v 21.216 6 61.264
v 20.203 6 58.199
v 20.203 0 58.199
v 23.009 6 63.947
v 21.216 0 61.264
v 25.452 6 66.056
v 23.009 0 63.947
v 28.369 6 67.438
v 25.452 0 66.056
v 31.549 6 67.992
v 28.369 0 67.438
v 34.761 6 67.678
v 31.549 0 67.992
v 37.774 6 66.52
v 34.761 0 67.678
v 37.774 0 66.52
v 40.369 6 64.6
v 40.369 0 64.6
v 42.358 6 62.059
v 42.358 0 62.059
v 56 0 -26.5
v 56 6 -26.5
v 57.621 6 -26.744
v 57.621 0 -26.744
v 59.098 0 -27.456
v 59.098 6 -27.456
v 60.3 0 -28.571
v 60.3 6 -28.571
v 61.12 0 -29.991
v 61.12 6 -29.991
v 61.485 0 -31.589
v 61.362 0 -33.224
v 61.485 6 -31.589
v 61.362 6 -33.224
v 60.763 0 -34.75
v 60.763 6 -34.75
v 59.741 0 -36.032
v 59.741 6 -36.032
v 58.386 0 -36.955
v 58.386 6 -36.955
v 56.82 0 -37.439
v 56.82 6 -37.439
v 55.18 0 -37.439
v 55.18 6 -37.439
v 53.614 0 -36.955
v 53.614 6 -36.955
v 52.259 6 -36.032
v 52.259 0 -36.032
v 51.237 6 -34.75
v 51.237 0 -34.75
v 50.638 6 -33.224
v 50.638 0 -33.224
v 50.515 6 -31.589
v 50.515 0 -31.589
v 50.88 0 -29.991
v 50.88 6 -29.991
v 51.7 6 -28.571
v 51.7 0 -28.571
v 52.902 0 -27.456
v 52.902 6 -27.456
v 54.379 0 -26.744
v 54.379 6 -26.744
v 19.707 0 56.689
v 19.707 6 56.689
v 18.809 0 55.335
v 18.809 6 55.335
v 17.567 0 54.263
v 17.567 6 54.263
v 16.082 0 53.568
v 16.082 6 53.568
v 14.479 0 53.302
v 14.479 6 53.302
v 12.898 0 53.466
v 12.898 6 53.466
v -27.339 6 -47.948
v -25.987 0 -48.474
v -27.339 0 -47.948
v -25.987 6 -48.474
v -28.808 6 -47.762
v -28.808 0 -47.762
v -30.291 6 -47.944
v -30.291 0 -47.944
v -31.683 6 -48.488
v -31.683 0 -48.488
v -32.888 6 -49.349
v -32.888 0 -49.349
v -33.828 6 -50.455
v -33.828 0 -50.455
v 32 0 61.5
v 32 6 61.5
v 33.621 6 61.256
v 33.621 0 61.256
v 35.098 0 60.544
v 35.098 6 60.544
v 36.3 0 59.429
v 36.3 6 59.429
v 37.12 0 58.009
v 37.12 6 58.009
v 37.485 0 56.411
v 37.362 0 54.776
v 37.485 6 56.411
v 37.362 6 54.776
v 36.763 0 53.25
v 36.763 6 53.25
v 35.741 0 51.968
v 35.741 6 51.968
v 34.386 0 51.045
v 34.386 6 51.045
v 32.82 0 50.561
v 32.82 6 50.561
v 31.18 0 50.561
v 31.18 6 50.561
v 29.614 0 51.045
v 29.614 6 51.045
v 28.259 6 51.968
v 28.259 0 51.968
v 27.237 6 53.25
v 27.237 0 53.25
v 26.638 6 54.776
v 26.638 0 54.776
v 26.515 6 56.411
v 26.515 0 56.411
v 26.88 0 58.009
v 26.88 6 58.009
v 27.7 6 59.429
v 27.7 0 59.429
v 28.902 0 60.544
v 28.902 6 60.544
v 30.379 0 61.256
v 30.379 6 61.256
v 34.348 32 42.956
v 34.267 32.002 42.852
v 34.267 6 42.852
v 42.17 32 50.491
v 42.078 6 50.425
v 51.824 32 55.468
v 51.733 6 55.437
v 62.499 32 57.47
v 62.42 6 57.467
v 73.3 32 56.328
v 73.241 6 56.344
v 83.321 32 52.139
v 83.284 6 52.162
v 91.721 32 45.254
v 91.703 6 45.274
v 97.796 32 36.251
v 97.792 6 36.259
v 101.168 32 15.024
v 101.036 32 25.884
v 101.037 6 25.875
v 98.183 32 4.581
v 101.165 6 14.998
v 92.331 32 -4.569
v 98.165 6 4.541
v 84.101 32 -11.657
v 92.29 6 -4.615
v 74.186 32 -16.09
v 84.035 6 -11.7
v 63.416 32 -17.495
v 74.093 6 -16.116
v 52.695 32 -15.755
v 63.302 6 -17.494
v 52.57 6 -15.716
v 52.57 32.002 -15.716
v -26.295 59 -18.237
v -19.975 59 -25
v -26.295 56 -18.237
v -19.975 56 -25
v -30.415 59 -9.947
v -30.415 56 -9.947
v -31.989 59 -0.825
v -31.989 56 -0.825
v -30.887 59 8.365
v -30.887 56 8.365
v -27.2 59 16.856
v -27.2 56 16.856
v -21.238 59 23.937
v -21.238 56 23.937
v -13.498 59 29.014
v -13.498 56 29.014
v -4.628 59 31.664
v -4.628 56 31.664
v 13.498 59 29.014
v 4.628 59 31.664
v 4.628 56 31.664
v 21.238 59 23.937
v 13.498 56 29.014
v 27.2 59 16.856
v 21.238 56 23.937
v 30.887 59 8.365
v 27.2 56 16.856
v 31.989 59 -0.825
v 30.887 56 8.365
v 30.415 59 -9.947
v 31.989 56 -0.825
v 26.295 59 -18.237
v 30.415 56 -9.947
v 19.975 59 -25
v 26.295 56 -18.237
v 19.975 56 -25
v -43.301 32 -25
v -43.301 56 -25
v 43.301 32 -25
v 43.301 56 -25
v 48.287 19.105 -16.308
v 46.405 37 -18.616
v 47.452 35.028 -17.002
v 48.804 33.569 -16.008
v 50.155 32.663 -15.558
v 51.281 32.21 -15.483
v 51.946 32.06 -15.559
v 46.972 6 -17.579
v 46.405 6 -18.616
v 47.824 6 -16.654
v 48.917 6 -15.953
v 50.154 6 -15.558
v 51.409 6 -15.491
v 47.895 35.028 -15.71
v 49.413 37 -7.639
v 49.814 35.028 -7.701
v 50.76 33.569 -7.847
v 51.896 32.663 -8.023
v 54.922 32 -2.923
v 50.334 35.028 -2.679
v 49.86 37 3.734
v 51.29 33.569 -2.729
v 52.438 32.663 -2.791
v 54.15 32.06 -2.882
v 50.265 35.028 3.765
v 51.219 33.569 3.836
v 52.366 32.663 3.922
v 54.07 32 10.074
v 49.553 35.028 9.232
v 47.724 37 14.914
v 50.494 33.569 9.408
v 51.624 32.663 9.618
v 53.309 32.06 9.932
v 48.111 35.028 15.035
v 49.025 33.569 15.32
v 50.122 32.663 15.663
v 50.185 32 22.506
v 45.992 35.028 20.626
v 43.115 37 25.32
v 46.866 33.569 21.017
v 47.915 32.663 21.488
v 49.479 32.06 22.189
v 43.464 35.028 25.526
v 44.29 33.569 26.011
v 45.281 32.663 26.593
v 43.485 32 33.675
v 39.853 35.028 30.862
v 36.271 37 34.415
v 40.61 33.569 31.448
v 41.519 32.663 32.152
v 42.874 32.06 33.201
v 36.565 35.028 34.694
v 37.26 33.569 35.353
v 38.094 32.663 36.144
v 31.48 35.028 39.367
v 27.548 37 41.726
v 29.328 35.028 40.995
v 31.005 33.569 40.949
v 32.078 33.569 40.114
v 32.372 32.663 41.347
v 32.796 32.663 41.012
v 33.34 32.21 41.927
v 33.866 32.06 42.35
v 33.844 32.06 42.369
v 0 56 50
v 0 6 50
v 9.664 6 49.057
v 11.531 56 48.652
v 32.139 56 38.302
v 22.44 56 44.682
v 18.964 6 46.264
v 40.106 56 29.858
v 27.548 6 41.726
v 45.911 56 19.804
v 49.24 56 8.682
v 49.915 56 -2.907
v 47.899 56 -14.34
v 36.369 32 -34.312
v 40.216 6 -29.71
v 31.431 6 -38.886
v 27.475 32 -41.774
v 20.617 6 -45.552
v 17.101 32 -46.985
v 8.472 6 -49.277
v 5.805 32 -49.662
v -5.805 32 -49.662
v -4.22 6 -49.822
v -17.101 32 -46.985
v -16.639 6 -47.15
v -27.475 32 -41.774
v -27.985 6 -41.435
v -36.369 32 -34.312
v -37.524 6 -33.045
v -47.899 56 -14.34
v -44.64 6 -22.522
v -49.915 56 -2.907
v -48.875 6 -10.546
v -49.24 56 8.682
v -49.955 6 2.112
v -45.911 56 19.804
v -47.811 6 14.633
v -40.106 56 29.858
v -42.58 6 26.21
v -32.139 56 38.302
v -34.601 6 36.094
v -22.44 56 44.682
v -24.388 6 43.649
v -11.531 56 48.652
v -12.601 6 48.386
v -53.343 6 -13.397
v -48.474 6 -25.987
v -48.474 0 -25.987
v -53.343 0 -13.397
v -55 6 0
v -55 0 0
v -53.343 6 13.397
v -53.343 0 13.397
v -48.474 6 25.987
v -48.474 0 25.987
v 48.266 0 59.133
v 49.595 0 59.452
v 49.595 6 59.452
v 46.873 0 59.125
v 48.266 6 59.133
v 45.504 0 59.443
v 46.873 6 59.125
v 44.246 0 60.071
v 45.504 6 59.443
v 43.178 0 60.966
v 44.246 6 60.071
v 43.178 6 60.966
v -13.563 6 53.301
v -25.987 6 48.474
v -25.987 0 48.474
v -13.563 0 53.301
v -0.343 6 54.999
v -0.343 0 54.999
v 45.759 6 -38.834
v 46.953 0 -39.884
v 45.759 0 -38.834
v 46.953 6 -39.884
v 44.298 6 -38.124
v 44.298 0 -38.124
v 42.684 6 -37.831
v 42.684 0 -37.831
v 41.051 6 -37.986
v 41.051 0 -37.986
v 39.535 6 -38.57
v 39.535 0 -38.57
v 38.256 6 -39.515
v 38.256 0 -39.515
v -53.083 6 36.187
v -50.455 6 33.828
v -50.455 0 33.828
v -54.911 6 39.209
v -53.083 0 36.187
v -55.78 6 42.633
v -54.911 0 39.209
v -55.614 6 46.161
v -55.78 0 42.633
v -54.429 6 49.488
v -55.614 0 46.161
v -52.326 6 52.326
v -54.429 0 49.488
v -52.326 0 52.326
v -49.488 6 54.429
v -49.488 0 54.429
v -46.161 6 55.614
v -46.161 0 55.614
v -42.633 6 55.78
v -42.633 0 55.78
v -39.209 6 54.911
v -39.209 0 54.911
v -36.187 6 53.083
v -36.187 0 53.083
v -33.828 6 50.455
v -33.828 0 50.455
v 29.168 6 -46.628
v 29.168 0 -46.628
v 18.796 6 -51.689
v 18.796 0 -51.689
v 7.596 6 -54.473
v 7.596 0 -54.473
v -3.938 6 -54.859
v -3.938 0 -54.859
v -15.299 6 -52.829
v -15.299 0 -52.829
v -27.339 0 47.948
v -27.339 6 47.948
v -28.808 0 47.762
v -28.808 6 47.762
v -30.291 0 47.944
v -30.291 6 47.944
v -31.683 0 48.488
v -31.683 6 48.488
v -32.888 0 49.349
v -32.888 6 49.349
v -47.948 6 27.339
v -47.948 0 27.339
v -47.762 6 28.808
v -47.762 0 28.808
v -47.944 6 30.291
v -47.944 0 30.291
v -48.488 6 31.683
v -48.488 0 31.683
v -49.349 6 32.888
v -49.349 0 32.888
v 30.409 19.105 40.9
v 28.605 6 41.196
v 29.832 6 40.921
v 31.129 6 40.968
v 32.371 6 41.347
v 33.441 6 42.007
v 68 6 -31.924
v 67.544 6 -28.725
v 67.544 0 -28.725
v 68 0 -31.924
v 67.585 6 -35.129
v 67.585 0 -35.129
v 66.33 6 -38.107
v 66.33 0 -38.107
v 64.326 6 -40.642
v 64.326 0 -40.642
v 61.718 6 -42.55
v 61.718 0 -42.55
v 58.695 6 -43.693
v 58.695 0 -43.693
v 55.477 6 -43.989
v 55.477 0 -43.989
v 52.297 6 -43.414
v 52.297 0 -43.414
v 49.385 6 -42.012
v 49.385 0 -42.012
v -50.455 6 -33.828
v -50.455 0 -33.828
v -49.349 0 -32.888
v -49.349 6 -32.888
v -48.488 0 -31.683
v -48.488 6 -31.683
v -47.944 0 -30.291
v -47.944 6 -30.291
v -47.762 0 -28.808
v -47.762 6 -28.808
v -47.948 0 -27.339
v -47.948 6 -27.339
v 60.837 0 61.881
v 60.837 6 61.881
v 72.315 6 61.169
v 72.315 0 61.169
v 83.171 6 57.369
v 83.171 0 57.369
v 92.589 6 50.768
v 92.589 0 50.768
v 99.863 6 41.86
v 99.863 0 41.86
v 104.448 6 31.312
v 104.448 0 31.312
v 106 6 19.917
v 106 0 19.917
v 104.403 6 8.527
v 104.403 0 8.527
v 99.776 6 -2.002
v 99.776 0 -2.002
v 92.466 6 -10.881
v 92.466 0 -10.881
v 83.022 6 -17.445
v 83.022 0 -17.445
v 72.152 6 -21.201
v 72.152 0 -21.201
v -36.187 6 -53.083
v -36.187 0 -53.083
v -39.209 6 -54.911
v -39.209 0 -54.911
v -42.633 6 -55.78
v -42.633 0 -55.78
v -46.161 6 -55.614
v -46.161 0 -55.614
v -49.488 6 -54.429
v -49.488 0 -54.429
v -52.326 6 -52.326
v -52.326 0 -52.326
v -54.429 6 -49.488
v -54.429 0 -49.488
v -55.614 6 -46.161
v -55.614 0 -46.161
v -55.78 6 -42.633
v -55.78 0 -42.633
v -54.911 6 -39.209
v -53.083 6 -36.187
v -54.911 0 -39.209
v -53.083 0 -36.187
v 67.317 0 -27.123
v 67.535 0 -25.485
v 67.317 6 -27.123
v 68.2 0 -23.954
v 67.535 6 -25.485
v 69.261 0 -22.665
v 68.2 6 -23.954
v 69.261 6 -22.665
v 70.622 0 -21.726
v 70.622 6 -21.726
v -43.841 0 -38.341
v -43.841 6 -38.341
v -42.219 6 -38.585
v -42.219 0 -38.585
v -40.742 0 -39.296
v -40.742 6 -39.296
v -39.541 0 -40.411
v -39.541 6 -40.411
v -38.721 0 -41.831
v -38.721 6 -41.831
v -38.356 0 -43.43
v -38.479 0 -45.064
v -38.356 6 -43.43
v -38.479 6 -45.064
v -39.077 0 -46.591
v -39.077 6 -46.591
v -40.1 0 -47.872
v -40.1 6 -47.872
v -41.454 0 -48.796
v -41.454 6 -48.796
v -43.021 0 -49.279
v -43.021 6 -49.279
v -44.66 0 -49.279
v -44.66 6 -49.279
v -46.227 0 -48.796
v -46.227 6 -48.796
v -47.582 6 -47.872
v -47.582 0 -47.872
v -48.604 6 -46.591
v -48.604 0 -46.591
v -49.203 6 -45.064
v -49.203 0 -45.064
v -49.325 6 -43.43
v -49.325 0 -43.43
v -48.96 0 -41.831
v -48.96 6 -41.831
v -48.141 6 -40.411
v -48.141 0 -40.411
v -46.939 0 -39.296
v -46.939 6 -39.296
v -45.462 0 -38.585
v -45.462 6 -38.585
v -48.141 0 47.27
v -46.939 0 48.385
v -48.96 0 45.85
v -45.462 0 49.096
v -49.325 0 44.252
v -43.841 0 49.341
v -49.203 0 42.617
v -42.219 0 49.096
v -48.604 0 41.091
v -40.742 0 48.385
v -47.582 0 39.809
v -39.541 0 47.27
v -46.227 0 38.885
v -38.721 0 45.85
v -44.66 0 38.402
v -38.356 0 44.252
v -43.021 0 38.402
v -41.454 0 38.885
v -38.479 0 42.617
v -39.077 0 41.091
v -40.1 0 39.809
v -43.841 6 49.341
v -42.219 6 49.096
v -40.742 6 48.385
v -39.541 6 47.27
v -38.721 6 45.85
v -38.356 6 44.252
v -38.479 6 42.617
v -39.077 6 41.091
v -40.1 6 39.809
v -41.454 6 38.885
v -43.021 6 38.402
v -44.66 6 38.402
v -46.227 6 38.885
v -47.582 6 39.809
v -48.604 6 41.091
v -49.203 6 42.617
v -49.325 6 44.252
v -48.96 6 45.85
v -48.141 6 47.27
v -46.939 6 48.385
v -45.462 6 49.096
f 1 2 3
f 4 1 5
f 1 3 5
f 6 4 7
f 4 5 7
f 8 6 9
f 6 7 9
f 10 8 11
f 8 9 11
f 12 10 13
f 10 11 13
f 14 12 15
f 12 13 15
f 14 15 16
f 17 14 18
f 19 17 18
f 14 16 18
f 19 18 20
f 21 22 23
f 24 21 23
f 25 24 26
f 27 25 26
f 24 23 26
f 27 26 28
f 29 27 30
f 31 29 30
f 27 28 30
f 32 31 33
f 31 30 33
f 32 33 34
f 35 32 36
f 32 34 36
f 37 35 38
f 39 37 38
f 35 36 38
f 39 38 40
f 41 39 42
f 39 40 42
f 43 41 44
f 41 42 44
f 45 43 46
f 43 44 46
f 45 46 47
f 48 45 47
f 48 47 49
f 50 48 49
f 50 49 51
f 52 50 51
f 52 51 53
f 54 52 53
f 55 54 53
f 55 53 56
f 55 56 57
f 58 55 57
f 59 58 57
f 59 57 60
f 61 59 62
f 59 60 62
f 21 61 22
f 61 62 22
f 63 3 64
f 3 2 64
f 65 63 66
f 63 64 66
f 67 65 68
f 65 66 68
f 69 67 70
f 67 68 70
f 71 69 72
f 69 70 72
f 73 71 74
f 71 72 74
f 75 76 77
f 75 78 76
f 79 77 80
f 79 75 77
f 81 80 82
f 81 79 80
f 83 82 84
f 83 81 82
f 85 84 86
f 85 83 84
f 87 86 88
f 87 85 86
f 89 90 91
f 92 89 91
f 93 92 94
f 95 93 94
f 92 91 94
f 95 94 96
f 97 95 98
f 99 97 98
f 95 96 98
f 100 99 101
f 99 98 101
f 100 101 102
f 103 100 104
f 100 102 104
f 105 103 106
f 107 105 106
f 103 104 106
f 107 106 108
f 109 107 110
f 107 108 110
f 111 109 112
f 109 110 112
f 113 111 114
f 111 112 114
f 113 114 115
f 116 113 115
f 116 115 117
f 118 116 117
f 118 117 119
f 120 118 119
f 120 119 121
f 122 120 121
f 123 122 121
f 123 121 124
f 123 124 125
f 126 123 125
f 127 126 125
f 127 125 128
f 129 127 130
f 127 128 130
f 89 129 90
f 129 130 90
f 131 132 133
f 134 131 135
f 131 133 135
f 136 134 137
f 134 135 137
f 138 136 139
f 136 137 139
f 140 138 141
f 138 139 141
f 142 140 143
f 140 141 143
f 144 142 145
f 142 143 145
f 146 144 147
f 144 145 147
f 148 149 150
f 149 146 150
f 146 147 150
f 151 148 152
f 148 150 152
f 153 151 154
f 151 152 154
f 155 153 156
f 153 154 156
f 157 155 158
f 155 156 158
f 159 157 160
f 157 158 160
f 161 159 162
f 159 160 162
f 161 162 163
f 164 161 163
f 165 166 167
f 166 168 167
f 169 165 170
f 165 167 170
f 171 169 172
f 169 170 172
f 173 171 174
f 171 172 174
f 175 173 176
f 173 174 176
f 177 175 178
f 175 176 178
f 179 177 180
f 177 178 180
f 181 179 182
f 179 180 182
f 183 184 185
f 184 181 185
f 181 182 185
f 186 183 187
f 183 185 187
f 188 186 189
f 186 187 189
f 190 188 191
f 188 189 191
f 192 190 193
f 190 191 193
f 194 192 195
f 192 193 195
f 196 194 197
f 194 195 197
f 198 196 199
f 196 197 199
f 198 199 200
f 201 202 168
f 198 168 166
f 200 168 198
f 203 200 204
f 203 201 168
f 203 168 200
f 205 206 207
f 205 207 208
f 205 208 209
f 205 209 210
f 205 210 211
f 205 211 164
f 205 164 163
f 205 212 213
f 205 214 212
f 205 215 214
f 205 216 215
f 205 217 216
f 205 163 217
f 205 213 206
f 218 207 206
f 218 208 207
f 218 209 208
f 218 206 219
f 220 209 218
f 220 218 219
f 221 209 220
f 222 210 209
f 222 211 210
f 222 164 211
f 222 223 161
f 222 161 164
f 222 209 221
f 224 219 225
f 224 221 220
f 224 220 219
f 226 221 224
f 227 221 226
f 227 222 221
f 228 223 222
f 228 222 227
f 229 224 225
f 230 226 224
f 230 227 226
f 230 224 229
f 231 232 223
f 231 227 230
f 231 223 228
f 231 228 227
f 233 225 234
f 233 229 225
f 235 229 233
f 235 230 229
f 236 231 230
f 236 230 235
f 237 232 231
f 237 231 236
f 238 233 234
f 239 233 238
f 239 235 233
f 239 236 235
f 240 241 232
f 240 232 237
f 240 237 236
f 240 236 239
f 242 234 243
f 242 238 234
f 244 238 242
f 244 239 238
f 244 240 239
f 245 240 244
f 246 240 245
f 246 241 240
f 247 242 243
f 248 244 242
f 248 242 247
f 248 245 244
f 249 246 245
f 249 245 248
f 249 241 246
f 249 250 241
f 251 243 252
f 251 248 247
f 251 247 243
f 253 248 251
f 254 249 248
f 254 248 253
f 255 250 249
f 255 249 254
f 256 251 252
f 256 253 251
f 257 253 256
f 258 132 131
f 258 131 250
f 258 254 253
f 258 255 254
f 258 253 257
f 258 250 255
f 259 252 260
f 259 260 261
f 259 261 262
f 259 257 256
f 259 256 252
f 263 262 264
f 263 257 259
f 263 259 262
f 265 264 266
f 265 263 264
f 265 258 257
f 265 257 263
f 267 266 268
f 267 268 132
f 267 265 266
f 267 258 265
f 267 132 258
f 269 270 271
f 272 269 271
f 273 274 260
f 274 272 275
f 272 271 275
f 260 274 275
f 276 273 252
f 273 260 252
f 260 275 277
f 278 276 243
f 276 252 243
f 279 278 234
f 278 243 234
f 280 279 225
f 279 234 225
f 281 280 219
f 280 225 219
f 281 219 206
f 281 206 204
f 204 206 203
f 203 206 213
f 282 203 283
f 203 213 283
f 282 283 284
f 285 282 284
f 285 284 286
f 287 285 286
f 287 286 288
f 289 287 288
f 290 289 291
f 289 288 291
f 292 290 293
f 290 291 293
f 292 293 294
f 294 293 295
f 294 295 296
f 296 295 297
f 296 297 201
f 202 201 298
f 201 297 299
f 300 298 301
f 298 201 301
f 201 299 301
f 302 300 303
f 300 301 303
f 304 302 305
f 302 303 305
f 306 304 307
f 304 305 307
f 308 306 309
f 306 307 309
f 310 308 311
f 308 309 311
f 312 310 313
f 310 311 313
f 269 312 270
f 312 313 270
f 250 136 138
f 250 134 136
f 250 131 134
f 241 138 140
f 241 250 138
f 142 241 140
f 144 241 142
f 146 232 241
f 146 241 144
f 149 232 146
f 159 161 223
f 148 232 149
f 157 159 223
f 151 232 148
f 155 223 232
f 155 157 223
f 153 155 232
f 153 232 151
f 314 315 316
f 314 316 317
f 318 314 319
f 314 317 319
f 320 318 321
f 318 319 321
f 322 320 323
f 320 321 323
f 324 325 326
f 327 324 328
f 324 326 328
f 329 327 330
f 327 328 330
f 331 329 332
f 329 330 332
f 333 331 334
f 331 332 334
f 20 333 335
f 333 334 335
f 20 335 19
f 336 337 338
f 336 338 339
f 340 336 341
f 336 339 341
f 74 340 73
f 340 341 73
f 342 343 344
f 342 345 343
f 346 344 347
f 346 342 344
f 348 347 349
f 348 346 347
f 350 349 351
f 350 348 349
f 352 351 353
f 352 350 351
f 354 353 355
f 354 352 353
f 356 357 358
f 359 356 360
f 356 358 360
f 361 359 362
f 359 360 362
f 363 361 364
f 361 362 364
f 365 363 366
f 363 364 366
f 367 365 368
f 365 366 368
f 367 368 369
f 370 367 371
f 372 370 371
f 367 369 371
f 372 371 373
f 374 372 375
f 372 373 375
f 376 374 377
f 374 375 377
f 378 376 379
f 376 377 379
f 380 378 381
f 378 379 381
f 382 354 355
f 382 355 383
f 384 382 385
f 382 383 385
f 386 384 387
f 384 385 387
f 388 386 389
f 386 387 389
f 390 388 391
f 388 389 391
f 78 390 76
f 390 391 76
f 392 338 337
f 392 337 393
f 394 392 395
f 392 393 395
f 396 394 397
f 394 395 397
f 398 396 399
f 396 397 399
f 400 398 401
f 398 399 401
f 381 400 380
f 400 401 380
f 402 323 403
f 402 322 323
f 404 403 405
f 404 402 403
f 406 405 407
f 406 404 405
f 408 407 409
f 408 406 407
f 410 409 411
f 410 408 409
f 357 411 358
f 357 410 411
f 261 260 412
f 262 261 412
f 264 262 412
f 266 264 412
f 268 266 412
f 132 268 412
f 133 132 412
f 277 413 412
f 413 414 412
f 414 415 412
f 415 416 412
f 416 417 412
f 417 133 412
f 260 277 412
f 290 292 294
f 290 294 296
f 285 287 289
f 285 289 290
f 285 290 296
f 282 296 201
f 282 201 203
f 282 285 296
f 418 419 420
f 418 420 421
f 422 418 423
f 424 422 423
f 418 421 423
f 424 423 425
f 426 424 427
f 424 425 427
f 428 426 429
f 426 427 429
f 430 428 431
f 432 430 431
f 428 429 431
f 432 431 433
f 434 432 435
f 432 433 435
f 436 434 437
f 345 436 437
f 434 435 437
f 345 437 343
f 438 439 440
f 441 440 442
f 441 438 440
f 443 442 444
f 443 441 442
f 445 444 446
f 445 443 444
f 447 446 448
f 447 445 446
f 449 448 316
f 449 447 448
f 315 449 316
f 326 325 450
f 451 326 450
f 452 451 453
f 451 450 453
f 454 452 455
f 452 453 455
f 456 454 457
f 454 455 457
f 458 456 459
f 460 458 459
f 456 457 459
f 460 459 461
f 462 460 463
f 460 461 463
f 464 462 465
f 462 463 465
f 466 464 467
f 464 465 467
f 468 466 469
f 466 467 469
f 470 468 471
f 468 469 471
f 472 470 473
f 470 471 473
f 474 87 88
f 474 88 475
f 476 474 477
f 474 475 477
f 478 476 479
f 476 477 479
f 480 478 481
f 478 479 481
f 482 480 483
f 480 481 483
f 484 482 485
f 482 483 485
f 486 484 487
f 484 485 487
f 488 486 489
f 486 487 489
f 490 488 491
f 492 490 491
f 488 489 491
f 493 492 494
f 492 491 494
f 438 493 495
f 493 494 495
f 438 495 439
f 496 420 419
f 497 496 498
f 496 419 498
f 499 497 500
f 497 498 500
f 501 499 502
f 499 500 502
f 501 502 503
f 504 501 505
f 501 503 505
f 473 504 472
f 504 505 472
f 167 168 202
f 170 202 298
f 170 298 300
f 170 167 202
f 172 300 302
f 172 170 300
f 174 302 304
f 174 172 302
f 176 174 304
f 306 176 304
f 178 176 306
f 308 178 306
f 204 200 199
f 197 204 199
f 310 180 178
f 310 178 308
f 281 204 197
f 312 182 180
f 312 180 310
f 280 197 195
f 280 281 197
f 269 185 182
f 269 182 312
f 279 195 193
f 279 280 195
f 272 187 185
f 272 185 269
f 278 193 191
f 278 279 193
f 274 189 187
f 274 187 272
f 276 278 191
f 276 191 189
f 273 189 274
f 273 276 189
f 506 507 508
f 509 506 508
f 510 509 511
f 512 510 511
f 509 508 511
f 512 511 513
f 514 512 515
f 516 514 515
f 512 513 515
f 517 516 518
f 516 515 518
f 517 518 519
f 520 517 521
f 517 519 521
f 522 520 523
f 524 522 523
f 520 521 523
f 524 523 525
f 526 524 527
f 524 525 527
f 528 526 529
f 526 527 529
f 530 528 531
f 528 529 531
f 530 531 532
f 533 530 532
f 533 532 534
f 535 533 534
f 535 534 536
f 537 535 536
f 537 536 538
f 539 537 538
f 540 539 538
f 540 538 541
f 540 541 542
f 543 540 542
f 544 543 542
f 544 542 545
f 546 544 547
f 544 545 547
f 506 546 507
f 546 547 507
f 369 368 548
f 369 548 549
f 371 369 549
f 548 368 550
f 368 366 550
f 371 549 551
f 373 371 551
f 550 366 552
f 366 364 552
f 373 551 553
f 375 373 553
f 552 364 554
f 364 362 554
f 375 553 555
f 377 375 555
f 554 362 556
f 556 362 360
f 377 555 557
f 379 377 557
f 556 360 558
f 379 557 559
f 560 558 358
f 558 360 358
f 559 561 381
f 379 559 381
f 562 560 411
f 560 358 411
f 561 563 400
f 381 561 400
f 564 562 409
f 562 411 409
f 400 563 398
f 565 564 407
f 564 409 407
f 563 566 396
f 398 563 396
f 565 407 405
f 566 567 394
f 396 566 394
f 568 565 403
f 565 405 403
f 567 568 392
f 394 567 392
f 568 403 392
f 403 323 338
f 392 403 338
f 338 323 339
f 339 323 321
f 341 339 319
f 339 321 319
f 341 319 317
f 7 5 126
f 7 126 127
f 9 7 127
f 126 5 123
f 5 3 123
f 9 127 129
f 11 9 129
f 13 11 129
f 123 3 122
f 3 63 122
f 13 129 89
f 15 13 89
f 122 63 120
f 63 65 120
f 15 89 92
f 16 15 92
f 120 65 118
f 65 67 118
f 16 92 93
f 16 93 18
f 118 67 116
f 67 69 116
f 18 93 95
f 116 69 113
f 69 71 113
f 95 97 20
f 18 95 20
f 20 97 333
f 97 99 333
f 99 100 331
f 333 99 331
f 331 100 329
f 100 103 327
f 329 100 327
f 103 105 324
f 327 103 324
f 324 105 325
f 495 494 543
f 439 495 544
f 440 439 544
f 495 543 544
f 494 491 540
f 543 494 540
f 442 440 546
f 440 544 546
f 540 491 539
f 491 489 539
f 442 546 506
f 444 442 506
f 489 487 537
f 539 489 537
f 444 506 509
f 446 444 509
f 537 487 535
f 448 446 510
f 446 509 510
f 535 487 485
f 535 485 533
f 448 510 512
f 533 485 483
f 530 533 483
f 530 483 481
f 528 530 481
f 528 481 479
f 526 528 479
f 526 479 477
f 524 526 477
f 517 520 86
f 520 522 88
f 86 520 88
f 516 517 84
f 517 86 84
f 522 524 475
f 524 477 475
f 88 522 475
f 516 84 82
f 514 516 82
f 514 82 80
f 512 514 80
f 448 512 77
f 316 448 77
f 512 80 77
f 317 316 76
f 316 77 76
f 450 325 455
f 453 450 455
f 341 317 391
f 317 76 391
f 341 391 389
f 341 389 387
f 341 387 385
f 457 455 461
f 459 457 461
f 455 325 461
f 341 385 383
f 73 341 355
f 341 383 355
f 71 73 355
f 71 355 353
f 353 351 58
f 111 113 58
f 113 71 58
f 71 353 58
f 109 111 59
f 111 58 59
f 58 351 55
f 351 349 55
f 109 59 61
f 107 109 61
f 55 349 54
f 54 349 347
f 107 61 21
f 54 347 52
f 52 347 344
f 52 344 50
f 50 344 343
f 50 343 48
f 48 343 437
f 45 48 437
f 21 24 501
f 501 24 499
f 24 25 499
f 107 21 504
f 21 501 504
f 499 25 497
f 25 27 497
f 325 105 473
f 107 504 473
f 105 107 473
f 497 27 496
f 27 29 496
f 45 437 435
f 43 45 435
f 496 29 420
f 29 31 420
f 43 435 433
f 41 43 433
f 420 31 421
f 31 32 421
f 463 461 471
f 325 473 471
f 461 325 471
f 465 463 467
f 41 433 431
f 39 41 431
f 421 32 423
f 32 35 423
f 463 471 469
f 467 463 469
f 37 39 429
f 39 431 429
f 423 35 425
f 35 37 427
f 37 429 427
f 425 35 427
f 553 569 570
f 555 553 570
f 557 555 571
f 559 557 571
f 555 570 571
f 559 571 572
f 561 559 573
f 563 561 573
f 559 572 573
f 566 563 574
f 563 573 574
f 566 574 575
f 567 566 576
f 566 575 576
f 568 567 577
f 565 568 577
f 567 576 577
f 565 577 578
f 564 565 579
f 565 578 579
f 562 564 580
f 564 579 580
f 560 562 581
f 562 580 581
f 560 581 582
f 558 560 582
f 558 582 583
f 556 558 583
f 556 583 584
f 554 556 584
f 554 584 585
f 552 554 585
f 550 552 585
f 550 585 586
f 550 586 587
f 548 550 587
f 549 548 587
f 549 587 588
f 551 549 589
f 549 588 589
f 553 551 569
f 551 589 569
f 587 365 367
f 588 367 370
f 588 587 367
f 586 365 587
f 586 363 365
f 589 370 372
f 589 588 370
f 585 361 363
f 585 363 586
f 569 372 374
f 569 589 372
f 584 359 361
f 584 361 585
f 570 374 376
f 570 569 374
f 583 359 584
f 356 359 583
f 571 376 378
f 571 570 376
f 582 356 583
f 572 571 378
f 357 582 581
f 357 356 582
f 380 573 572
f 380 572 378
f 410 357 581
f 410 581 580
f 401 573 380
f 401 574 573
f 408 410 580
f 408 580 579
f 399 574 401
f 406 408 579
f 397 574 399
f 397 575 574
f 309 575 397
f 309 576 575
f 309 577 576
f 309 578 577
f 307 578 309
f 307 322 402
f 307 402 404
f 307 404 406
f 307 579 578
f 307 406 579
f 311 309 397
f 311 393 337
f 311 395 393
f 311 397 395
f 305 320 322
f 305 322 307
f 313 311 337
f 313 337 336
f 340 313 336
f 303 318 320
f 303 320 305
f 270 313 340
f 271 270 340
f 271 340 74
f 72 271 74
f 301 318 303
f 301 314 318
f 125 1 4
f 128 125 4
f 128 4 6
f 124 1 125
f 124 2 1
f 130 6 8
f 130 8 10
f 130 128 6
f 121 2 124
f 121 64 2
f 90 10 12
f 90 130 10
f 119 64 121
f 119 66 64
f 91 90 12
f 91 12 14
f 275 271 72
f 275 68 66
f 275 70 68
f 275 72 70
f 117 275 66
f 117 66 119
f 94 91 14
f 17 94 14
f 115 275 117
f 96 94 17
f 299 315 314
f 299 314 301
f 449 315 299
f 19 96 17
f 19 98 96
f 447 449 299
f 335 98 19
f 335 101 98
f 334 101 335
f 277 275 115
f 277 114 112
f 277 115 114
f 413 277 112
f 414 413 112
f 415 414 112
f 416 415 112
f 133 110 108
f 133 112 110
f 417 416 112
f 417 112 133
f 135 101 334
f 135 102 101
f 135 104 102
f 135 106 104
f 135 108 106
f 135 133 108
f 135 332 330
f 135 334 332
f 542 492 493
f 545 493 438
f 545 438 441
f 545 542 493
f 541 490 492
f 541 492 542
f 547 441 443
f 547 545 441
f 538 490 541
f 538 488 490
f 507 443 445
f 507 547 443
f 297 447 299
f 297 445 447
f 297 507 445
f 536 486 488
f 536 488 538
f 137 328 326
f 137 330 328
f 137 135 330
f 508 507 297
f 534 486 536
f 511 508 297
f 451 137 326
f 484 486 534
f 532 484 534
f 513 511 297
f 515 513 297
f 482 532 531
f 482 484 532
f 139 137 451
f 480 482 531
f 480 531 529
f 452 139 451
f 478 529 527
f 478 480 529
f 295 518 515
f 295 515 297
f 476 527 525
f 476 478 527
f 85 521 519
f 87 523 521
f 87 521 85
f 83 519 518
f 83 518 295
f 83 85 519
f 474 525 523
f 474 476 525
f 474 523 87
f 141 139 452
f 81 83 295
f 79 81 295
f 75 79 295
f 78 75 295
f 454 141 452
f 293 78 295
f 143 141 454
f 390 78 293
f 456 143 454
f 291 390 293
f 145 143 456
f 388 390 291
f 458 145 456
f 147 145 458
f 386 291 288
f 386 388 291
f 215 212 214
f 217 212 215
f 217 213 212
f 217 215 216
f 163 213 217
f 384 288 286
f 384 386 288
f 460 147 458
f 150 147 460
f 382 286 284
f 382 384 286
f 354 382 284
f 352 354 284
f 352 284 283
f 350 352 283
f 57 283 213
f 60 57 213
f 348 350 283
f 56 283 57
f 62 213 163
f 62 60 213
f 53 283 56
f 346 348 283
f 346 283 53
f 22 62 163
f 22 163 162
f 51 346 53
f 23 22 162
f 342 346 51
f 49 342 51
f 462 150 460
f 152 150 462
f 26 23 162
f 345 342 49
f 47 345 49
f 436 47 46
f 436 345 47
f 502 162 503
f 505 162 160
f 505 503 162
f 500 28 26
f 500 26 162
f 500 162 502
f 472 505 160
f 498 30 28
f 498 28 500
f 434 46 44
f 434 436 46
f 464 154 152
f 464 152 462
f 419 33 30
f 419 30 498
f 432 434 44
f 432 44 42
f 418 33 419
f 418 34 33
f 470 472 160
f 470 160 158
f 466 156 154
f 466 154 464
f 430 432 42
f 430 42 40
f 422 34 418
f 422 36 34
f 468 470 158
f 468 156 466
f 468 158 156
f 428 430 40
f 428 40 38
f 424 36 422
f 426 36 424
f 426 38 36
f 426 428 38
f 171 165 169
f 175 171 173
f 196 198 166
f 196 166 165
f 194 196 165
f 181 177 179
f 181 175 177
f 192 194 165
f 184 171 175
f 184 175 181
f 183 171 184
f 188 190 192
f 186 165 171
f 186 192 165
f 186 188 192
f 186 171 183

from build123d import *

# Parameters (mm, degrees)
BOSS_EXTRUDE1_DEPTH = 6
SKETCH2_R           = 5.5
CUT_EXTRUDE1_DEPTH  = 6
SKETCH3_R           = 50
BOSS_EXTRUDE2_DEPTH = 50
SKETCH4_R           = 37.5
BOSS_EXTRUDE3_DEPTH = 26
SKETCH5_R           = 32
BOSS_EXTRUDE4_DEPTH = 3
FILLET2_R           = 6
FILLET3_R           = 6
FILLET4_R           = 5
CUT_EXTRUDE2_START  = -27
CUT_EXTRUDE2_DEPTH  = 27


with BuildPart() as part:
    # Sketch1 → Boss-Extrude1 (new body)
    with BuildSketch(Plane(origin=(0, 0, 0), x_dir=(1, 0, 0), z_dir=(0, 1, 0))):
        with BuildLine():
            ThreePointArc((21.211789327, -50.745048956), (28.860136885, -67.581936782), (43.965179902, -56.913493246))
            ThreePointArc((43.965179902, -56.913493246), (104.875389558, -29.654145663), (62.597817721, 21.976587342))
            ThreePointArc((62.597817721, 21.976587342), (62.107138398, 42.329707672), (44.037643352, 32.949749135))
            ThreePointArc((44.037643352, 32.949749135), (8.49481412, 54.340023308), (-31.880473469, 44.817802394))
            ThreePointArc((-31.880473469, 44.817802394), (-52.325901808, 52.325901808), (-44.817802394, 31.880473469))
            ThreePointArc((-44.817802394, 31.880473469), (-55, 0), (-44.817802394, -31.880473469))
            ThreePointArc((-44.817802394, -31.880473469), (-52.325901808, -52.325901808), (-31.880473469, -44.817802394))
            ThreePointArc((-31.880473469, -44.817802394), (-6.102316632, -54.660421986), (21.211789327, -50.745048956))
        make_face()
    extrude(amount=BOSS_EXTRUDE1_DEPTH)

    # Sketch2 → Cut-Extrude1 (cut)
    with BuildSketch(Plane(origin=(0, 6, 0), x_dir=(1, 0, 0), z_dir=(0, 1, 0))):
        with Locations(Location((56, 32, 0), (0, 0, 270))):
            Circle(SKETCH2_R)
        with Locations(Location((-43.840620434, 43.840620434, 0), (0, 0, 270))):
            Circle(SKETCH2_R)
        with Locations(Location((-43.840620434, -43.840620434, 0), (0, 0, 270))):
            Circle(SKETCH2_R)
        with Locations(Location((32, -56, 0), (0, 0, 270))):
            Circle(SKETCH2_R)
    extrude(amount=-CUT_EXTRUDE1_DEPTH, mode=Mode.SUBTRACT)

    # Sketch3 → Boss-Extrude2 (add)
    with BuildSketch(Plane(origin=(0, 6, 0), x_dir=(1, 0, 0), z_dir=(0, 1, 0))):
        with Locations(Location((0, 0, 0), (0, 0, 270))):
            Circle(SKETCH3_R)
    extrude(amount=BOSS_EXTRUDE2_DEPTH)

    # Sketch4 → Boss-Extrude3 (add)
    with BuildSketch(Plane(origin=(0, 6, 0), x_dir=(1, 0, 0), z_dir=(0, 1, 0))):
        with Locations((64, -20)):
            Circle(SKETCH4_R)
    extrude(amount=BOSS_EXTRUDE3_DEPTH)

    # Sketch5 → Boss-Extrude4 (add)
    with BuildSketch(Plane(origin=(0, 56, 0), x_dir=(1, 0, 0), z_dir=(0, 1, 0))):
        with Locations(Location((0, 0, 0), (0, 0, 270))):
            Circle(SKETCH5_R)
    extrude(amount=BOSS_EXTRUDE4_DEPTH)

    # Fillet2
    fillet2_edges = [part.edges().sort_by_distance(p)[0] for p in [
        (44.037643352, 3, -32.949749135),
    ]]
    fillet(fillet2_edges, radius=FILLET2_R)

    # Fillet3
    fillet3_edges = [part.edges().sort_by_distance(p)[0] for p in [
        (21.211789327, 3, 50.745048956),
        (-31.880473469, 3, 44.817802394),
        (-44.817802394, 3, 31.880473469),
        (-44.817802394, 3, -31.880473469),
        (-31.880473469, 3, -44.817802394),
        (62.597817721, 3, -21.976587342),
        (43.965179902, 3, 56.913493246),
    ]]
    fillet(fillet3_edges, radius=FILLET3_R)

    # Fillet4
    fillet4_edges = [part.edges().sort_by_distance(p)[0] for p in [
        (47.723998902, 32, 14.913749657),
        (48.021654026, 19, -13.925542883),
        (31.547740992, 19, 38.790978827),
    ]]
    fillet(fillet4_edges, radius=FILLET4_R)

    # Sketch6 → Cut-Extrude2 (cut)
    with BuildSketch(Plane(origin=(0, 59, 0), x_dir=(1, 0, 0), z_dir=(0, 1, 0)).offset(CUT_EXTRUDE2_START)):
        with BuildLine():
            Line((0, 25), (43.301270189, 25))
            ThreePointArc((43.301270189, 25), (0, 50), (-43.301270189, 25))
            Line((-43.301270189, 25), (0, 25))
        make_face()
    extrude(amount=CUT_EXTRUDE2_DEPTH, mode=Mode.SUBTRACT)


solid = part.part
